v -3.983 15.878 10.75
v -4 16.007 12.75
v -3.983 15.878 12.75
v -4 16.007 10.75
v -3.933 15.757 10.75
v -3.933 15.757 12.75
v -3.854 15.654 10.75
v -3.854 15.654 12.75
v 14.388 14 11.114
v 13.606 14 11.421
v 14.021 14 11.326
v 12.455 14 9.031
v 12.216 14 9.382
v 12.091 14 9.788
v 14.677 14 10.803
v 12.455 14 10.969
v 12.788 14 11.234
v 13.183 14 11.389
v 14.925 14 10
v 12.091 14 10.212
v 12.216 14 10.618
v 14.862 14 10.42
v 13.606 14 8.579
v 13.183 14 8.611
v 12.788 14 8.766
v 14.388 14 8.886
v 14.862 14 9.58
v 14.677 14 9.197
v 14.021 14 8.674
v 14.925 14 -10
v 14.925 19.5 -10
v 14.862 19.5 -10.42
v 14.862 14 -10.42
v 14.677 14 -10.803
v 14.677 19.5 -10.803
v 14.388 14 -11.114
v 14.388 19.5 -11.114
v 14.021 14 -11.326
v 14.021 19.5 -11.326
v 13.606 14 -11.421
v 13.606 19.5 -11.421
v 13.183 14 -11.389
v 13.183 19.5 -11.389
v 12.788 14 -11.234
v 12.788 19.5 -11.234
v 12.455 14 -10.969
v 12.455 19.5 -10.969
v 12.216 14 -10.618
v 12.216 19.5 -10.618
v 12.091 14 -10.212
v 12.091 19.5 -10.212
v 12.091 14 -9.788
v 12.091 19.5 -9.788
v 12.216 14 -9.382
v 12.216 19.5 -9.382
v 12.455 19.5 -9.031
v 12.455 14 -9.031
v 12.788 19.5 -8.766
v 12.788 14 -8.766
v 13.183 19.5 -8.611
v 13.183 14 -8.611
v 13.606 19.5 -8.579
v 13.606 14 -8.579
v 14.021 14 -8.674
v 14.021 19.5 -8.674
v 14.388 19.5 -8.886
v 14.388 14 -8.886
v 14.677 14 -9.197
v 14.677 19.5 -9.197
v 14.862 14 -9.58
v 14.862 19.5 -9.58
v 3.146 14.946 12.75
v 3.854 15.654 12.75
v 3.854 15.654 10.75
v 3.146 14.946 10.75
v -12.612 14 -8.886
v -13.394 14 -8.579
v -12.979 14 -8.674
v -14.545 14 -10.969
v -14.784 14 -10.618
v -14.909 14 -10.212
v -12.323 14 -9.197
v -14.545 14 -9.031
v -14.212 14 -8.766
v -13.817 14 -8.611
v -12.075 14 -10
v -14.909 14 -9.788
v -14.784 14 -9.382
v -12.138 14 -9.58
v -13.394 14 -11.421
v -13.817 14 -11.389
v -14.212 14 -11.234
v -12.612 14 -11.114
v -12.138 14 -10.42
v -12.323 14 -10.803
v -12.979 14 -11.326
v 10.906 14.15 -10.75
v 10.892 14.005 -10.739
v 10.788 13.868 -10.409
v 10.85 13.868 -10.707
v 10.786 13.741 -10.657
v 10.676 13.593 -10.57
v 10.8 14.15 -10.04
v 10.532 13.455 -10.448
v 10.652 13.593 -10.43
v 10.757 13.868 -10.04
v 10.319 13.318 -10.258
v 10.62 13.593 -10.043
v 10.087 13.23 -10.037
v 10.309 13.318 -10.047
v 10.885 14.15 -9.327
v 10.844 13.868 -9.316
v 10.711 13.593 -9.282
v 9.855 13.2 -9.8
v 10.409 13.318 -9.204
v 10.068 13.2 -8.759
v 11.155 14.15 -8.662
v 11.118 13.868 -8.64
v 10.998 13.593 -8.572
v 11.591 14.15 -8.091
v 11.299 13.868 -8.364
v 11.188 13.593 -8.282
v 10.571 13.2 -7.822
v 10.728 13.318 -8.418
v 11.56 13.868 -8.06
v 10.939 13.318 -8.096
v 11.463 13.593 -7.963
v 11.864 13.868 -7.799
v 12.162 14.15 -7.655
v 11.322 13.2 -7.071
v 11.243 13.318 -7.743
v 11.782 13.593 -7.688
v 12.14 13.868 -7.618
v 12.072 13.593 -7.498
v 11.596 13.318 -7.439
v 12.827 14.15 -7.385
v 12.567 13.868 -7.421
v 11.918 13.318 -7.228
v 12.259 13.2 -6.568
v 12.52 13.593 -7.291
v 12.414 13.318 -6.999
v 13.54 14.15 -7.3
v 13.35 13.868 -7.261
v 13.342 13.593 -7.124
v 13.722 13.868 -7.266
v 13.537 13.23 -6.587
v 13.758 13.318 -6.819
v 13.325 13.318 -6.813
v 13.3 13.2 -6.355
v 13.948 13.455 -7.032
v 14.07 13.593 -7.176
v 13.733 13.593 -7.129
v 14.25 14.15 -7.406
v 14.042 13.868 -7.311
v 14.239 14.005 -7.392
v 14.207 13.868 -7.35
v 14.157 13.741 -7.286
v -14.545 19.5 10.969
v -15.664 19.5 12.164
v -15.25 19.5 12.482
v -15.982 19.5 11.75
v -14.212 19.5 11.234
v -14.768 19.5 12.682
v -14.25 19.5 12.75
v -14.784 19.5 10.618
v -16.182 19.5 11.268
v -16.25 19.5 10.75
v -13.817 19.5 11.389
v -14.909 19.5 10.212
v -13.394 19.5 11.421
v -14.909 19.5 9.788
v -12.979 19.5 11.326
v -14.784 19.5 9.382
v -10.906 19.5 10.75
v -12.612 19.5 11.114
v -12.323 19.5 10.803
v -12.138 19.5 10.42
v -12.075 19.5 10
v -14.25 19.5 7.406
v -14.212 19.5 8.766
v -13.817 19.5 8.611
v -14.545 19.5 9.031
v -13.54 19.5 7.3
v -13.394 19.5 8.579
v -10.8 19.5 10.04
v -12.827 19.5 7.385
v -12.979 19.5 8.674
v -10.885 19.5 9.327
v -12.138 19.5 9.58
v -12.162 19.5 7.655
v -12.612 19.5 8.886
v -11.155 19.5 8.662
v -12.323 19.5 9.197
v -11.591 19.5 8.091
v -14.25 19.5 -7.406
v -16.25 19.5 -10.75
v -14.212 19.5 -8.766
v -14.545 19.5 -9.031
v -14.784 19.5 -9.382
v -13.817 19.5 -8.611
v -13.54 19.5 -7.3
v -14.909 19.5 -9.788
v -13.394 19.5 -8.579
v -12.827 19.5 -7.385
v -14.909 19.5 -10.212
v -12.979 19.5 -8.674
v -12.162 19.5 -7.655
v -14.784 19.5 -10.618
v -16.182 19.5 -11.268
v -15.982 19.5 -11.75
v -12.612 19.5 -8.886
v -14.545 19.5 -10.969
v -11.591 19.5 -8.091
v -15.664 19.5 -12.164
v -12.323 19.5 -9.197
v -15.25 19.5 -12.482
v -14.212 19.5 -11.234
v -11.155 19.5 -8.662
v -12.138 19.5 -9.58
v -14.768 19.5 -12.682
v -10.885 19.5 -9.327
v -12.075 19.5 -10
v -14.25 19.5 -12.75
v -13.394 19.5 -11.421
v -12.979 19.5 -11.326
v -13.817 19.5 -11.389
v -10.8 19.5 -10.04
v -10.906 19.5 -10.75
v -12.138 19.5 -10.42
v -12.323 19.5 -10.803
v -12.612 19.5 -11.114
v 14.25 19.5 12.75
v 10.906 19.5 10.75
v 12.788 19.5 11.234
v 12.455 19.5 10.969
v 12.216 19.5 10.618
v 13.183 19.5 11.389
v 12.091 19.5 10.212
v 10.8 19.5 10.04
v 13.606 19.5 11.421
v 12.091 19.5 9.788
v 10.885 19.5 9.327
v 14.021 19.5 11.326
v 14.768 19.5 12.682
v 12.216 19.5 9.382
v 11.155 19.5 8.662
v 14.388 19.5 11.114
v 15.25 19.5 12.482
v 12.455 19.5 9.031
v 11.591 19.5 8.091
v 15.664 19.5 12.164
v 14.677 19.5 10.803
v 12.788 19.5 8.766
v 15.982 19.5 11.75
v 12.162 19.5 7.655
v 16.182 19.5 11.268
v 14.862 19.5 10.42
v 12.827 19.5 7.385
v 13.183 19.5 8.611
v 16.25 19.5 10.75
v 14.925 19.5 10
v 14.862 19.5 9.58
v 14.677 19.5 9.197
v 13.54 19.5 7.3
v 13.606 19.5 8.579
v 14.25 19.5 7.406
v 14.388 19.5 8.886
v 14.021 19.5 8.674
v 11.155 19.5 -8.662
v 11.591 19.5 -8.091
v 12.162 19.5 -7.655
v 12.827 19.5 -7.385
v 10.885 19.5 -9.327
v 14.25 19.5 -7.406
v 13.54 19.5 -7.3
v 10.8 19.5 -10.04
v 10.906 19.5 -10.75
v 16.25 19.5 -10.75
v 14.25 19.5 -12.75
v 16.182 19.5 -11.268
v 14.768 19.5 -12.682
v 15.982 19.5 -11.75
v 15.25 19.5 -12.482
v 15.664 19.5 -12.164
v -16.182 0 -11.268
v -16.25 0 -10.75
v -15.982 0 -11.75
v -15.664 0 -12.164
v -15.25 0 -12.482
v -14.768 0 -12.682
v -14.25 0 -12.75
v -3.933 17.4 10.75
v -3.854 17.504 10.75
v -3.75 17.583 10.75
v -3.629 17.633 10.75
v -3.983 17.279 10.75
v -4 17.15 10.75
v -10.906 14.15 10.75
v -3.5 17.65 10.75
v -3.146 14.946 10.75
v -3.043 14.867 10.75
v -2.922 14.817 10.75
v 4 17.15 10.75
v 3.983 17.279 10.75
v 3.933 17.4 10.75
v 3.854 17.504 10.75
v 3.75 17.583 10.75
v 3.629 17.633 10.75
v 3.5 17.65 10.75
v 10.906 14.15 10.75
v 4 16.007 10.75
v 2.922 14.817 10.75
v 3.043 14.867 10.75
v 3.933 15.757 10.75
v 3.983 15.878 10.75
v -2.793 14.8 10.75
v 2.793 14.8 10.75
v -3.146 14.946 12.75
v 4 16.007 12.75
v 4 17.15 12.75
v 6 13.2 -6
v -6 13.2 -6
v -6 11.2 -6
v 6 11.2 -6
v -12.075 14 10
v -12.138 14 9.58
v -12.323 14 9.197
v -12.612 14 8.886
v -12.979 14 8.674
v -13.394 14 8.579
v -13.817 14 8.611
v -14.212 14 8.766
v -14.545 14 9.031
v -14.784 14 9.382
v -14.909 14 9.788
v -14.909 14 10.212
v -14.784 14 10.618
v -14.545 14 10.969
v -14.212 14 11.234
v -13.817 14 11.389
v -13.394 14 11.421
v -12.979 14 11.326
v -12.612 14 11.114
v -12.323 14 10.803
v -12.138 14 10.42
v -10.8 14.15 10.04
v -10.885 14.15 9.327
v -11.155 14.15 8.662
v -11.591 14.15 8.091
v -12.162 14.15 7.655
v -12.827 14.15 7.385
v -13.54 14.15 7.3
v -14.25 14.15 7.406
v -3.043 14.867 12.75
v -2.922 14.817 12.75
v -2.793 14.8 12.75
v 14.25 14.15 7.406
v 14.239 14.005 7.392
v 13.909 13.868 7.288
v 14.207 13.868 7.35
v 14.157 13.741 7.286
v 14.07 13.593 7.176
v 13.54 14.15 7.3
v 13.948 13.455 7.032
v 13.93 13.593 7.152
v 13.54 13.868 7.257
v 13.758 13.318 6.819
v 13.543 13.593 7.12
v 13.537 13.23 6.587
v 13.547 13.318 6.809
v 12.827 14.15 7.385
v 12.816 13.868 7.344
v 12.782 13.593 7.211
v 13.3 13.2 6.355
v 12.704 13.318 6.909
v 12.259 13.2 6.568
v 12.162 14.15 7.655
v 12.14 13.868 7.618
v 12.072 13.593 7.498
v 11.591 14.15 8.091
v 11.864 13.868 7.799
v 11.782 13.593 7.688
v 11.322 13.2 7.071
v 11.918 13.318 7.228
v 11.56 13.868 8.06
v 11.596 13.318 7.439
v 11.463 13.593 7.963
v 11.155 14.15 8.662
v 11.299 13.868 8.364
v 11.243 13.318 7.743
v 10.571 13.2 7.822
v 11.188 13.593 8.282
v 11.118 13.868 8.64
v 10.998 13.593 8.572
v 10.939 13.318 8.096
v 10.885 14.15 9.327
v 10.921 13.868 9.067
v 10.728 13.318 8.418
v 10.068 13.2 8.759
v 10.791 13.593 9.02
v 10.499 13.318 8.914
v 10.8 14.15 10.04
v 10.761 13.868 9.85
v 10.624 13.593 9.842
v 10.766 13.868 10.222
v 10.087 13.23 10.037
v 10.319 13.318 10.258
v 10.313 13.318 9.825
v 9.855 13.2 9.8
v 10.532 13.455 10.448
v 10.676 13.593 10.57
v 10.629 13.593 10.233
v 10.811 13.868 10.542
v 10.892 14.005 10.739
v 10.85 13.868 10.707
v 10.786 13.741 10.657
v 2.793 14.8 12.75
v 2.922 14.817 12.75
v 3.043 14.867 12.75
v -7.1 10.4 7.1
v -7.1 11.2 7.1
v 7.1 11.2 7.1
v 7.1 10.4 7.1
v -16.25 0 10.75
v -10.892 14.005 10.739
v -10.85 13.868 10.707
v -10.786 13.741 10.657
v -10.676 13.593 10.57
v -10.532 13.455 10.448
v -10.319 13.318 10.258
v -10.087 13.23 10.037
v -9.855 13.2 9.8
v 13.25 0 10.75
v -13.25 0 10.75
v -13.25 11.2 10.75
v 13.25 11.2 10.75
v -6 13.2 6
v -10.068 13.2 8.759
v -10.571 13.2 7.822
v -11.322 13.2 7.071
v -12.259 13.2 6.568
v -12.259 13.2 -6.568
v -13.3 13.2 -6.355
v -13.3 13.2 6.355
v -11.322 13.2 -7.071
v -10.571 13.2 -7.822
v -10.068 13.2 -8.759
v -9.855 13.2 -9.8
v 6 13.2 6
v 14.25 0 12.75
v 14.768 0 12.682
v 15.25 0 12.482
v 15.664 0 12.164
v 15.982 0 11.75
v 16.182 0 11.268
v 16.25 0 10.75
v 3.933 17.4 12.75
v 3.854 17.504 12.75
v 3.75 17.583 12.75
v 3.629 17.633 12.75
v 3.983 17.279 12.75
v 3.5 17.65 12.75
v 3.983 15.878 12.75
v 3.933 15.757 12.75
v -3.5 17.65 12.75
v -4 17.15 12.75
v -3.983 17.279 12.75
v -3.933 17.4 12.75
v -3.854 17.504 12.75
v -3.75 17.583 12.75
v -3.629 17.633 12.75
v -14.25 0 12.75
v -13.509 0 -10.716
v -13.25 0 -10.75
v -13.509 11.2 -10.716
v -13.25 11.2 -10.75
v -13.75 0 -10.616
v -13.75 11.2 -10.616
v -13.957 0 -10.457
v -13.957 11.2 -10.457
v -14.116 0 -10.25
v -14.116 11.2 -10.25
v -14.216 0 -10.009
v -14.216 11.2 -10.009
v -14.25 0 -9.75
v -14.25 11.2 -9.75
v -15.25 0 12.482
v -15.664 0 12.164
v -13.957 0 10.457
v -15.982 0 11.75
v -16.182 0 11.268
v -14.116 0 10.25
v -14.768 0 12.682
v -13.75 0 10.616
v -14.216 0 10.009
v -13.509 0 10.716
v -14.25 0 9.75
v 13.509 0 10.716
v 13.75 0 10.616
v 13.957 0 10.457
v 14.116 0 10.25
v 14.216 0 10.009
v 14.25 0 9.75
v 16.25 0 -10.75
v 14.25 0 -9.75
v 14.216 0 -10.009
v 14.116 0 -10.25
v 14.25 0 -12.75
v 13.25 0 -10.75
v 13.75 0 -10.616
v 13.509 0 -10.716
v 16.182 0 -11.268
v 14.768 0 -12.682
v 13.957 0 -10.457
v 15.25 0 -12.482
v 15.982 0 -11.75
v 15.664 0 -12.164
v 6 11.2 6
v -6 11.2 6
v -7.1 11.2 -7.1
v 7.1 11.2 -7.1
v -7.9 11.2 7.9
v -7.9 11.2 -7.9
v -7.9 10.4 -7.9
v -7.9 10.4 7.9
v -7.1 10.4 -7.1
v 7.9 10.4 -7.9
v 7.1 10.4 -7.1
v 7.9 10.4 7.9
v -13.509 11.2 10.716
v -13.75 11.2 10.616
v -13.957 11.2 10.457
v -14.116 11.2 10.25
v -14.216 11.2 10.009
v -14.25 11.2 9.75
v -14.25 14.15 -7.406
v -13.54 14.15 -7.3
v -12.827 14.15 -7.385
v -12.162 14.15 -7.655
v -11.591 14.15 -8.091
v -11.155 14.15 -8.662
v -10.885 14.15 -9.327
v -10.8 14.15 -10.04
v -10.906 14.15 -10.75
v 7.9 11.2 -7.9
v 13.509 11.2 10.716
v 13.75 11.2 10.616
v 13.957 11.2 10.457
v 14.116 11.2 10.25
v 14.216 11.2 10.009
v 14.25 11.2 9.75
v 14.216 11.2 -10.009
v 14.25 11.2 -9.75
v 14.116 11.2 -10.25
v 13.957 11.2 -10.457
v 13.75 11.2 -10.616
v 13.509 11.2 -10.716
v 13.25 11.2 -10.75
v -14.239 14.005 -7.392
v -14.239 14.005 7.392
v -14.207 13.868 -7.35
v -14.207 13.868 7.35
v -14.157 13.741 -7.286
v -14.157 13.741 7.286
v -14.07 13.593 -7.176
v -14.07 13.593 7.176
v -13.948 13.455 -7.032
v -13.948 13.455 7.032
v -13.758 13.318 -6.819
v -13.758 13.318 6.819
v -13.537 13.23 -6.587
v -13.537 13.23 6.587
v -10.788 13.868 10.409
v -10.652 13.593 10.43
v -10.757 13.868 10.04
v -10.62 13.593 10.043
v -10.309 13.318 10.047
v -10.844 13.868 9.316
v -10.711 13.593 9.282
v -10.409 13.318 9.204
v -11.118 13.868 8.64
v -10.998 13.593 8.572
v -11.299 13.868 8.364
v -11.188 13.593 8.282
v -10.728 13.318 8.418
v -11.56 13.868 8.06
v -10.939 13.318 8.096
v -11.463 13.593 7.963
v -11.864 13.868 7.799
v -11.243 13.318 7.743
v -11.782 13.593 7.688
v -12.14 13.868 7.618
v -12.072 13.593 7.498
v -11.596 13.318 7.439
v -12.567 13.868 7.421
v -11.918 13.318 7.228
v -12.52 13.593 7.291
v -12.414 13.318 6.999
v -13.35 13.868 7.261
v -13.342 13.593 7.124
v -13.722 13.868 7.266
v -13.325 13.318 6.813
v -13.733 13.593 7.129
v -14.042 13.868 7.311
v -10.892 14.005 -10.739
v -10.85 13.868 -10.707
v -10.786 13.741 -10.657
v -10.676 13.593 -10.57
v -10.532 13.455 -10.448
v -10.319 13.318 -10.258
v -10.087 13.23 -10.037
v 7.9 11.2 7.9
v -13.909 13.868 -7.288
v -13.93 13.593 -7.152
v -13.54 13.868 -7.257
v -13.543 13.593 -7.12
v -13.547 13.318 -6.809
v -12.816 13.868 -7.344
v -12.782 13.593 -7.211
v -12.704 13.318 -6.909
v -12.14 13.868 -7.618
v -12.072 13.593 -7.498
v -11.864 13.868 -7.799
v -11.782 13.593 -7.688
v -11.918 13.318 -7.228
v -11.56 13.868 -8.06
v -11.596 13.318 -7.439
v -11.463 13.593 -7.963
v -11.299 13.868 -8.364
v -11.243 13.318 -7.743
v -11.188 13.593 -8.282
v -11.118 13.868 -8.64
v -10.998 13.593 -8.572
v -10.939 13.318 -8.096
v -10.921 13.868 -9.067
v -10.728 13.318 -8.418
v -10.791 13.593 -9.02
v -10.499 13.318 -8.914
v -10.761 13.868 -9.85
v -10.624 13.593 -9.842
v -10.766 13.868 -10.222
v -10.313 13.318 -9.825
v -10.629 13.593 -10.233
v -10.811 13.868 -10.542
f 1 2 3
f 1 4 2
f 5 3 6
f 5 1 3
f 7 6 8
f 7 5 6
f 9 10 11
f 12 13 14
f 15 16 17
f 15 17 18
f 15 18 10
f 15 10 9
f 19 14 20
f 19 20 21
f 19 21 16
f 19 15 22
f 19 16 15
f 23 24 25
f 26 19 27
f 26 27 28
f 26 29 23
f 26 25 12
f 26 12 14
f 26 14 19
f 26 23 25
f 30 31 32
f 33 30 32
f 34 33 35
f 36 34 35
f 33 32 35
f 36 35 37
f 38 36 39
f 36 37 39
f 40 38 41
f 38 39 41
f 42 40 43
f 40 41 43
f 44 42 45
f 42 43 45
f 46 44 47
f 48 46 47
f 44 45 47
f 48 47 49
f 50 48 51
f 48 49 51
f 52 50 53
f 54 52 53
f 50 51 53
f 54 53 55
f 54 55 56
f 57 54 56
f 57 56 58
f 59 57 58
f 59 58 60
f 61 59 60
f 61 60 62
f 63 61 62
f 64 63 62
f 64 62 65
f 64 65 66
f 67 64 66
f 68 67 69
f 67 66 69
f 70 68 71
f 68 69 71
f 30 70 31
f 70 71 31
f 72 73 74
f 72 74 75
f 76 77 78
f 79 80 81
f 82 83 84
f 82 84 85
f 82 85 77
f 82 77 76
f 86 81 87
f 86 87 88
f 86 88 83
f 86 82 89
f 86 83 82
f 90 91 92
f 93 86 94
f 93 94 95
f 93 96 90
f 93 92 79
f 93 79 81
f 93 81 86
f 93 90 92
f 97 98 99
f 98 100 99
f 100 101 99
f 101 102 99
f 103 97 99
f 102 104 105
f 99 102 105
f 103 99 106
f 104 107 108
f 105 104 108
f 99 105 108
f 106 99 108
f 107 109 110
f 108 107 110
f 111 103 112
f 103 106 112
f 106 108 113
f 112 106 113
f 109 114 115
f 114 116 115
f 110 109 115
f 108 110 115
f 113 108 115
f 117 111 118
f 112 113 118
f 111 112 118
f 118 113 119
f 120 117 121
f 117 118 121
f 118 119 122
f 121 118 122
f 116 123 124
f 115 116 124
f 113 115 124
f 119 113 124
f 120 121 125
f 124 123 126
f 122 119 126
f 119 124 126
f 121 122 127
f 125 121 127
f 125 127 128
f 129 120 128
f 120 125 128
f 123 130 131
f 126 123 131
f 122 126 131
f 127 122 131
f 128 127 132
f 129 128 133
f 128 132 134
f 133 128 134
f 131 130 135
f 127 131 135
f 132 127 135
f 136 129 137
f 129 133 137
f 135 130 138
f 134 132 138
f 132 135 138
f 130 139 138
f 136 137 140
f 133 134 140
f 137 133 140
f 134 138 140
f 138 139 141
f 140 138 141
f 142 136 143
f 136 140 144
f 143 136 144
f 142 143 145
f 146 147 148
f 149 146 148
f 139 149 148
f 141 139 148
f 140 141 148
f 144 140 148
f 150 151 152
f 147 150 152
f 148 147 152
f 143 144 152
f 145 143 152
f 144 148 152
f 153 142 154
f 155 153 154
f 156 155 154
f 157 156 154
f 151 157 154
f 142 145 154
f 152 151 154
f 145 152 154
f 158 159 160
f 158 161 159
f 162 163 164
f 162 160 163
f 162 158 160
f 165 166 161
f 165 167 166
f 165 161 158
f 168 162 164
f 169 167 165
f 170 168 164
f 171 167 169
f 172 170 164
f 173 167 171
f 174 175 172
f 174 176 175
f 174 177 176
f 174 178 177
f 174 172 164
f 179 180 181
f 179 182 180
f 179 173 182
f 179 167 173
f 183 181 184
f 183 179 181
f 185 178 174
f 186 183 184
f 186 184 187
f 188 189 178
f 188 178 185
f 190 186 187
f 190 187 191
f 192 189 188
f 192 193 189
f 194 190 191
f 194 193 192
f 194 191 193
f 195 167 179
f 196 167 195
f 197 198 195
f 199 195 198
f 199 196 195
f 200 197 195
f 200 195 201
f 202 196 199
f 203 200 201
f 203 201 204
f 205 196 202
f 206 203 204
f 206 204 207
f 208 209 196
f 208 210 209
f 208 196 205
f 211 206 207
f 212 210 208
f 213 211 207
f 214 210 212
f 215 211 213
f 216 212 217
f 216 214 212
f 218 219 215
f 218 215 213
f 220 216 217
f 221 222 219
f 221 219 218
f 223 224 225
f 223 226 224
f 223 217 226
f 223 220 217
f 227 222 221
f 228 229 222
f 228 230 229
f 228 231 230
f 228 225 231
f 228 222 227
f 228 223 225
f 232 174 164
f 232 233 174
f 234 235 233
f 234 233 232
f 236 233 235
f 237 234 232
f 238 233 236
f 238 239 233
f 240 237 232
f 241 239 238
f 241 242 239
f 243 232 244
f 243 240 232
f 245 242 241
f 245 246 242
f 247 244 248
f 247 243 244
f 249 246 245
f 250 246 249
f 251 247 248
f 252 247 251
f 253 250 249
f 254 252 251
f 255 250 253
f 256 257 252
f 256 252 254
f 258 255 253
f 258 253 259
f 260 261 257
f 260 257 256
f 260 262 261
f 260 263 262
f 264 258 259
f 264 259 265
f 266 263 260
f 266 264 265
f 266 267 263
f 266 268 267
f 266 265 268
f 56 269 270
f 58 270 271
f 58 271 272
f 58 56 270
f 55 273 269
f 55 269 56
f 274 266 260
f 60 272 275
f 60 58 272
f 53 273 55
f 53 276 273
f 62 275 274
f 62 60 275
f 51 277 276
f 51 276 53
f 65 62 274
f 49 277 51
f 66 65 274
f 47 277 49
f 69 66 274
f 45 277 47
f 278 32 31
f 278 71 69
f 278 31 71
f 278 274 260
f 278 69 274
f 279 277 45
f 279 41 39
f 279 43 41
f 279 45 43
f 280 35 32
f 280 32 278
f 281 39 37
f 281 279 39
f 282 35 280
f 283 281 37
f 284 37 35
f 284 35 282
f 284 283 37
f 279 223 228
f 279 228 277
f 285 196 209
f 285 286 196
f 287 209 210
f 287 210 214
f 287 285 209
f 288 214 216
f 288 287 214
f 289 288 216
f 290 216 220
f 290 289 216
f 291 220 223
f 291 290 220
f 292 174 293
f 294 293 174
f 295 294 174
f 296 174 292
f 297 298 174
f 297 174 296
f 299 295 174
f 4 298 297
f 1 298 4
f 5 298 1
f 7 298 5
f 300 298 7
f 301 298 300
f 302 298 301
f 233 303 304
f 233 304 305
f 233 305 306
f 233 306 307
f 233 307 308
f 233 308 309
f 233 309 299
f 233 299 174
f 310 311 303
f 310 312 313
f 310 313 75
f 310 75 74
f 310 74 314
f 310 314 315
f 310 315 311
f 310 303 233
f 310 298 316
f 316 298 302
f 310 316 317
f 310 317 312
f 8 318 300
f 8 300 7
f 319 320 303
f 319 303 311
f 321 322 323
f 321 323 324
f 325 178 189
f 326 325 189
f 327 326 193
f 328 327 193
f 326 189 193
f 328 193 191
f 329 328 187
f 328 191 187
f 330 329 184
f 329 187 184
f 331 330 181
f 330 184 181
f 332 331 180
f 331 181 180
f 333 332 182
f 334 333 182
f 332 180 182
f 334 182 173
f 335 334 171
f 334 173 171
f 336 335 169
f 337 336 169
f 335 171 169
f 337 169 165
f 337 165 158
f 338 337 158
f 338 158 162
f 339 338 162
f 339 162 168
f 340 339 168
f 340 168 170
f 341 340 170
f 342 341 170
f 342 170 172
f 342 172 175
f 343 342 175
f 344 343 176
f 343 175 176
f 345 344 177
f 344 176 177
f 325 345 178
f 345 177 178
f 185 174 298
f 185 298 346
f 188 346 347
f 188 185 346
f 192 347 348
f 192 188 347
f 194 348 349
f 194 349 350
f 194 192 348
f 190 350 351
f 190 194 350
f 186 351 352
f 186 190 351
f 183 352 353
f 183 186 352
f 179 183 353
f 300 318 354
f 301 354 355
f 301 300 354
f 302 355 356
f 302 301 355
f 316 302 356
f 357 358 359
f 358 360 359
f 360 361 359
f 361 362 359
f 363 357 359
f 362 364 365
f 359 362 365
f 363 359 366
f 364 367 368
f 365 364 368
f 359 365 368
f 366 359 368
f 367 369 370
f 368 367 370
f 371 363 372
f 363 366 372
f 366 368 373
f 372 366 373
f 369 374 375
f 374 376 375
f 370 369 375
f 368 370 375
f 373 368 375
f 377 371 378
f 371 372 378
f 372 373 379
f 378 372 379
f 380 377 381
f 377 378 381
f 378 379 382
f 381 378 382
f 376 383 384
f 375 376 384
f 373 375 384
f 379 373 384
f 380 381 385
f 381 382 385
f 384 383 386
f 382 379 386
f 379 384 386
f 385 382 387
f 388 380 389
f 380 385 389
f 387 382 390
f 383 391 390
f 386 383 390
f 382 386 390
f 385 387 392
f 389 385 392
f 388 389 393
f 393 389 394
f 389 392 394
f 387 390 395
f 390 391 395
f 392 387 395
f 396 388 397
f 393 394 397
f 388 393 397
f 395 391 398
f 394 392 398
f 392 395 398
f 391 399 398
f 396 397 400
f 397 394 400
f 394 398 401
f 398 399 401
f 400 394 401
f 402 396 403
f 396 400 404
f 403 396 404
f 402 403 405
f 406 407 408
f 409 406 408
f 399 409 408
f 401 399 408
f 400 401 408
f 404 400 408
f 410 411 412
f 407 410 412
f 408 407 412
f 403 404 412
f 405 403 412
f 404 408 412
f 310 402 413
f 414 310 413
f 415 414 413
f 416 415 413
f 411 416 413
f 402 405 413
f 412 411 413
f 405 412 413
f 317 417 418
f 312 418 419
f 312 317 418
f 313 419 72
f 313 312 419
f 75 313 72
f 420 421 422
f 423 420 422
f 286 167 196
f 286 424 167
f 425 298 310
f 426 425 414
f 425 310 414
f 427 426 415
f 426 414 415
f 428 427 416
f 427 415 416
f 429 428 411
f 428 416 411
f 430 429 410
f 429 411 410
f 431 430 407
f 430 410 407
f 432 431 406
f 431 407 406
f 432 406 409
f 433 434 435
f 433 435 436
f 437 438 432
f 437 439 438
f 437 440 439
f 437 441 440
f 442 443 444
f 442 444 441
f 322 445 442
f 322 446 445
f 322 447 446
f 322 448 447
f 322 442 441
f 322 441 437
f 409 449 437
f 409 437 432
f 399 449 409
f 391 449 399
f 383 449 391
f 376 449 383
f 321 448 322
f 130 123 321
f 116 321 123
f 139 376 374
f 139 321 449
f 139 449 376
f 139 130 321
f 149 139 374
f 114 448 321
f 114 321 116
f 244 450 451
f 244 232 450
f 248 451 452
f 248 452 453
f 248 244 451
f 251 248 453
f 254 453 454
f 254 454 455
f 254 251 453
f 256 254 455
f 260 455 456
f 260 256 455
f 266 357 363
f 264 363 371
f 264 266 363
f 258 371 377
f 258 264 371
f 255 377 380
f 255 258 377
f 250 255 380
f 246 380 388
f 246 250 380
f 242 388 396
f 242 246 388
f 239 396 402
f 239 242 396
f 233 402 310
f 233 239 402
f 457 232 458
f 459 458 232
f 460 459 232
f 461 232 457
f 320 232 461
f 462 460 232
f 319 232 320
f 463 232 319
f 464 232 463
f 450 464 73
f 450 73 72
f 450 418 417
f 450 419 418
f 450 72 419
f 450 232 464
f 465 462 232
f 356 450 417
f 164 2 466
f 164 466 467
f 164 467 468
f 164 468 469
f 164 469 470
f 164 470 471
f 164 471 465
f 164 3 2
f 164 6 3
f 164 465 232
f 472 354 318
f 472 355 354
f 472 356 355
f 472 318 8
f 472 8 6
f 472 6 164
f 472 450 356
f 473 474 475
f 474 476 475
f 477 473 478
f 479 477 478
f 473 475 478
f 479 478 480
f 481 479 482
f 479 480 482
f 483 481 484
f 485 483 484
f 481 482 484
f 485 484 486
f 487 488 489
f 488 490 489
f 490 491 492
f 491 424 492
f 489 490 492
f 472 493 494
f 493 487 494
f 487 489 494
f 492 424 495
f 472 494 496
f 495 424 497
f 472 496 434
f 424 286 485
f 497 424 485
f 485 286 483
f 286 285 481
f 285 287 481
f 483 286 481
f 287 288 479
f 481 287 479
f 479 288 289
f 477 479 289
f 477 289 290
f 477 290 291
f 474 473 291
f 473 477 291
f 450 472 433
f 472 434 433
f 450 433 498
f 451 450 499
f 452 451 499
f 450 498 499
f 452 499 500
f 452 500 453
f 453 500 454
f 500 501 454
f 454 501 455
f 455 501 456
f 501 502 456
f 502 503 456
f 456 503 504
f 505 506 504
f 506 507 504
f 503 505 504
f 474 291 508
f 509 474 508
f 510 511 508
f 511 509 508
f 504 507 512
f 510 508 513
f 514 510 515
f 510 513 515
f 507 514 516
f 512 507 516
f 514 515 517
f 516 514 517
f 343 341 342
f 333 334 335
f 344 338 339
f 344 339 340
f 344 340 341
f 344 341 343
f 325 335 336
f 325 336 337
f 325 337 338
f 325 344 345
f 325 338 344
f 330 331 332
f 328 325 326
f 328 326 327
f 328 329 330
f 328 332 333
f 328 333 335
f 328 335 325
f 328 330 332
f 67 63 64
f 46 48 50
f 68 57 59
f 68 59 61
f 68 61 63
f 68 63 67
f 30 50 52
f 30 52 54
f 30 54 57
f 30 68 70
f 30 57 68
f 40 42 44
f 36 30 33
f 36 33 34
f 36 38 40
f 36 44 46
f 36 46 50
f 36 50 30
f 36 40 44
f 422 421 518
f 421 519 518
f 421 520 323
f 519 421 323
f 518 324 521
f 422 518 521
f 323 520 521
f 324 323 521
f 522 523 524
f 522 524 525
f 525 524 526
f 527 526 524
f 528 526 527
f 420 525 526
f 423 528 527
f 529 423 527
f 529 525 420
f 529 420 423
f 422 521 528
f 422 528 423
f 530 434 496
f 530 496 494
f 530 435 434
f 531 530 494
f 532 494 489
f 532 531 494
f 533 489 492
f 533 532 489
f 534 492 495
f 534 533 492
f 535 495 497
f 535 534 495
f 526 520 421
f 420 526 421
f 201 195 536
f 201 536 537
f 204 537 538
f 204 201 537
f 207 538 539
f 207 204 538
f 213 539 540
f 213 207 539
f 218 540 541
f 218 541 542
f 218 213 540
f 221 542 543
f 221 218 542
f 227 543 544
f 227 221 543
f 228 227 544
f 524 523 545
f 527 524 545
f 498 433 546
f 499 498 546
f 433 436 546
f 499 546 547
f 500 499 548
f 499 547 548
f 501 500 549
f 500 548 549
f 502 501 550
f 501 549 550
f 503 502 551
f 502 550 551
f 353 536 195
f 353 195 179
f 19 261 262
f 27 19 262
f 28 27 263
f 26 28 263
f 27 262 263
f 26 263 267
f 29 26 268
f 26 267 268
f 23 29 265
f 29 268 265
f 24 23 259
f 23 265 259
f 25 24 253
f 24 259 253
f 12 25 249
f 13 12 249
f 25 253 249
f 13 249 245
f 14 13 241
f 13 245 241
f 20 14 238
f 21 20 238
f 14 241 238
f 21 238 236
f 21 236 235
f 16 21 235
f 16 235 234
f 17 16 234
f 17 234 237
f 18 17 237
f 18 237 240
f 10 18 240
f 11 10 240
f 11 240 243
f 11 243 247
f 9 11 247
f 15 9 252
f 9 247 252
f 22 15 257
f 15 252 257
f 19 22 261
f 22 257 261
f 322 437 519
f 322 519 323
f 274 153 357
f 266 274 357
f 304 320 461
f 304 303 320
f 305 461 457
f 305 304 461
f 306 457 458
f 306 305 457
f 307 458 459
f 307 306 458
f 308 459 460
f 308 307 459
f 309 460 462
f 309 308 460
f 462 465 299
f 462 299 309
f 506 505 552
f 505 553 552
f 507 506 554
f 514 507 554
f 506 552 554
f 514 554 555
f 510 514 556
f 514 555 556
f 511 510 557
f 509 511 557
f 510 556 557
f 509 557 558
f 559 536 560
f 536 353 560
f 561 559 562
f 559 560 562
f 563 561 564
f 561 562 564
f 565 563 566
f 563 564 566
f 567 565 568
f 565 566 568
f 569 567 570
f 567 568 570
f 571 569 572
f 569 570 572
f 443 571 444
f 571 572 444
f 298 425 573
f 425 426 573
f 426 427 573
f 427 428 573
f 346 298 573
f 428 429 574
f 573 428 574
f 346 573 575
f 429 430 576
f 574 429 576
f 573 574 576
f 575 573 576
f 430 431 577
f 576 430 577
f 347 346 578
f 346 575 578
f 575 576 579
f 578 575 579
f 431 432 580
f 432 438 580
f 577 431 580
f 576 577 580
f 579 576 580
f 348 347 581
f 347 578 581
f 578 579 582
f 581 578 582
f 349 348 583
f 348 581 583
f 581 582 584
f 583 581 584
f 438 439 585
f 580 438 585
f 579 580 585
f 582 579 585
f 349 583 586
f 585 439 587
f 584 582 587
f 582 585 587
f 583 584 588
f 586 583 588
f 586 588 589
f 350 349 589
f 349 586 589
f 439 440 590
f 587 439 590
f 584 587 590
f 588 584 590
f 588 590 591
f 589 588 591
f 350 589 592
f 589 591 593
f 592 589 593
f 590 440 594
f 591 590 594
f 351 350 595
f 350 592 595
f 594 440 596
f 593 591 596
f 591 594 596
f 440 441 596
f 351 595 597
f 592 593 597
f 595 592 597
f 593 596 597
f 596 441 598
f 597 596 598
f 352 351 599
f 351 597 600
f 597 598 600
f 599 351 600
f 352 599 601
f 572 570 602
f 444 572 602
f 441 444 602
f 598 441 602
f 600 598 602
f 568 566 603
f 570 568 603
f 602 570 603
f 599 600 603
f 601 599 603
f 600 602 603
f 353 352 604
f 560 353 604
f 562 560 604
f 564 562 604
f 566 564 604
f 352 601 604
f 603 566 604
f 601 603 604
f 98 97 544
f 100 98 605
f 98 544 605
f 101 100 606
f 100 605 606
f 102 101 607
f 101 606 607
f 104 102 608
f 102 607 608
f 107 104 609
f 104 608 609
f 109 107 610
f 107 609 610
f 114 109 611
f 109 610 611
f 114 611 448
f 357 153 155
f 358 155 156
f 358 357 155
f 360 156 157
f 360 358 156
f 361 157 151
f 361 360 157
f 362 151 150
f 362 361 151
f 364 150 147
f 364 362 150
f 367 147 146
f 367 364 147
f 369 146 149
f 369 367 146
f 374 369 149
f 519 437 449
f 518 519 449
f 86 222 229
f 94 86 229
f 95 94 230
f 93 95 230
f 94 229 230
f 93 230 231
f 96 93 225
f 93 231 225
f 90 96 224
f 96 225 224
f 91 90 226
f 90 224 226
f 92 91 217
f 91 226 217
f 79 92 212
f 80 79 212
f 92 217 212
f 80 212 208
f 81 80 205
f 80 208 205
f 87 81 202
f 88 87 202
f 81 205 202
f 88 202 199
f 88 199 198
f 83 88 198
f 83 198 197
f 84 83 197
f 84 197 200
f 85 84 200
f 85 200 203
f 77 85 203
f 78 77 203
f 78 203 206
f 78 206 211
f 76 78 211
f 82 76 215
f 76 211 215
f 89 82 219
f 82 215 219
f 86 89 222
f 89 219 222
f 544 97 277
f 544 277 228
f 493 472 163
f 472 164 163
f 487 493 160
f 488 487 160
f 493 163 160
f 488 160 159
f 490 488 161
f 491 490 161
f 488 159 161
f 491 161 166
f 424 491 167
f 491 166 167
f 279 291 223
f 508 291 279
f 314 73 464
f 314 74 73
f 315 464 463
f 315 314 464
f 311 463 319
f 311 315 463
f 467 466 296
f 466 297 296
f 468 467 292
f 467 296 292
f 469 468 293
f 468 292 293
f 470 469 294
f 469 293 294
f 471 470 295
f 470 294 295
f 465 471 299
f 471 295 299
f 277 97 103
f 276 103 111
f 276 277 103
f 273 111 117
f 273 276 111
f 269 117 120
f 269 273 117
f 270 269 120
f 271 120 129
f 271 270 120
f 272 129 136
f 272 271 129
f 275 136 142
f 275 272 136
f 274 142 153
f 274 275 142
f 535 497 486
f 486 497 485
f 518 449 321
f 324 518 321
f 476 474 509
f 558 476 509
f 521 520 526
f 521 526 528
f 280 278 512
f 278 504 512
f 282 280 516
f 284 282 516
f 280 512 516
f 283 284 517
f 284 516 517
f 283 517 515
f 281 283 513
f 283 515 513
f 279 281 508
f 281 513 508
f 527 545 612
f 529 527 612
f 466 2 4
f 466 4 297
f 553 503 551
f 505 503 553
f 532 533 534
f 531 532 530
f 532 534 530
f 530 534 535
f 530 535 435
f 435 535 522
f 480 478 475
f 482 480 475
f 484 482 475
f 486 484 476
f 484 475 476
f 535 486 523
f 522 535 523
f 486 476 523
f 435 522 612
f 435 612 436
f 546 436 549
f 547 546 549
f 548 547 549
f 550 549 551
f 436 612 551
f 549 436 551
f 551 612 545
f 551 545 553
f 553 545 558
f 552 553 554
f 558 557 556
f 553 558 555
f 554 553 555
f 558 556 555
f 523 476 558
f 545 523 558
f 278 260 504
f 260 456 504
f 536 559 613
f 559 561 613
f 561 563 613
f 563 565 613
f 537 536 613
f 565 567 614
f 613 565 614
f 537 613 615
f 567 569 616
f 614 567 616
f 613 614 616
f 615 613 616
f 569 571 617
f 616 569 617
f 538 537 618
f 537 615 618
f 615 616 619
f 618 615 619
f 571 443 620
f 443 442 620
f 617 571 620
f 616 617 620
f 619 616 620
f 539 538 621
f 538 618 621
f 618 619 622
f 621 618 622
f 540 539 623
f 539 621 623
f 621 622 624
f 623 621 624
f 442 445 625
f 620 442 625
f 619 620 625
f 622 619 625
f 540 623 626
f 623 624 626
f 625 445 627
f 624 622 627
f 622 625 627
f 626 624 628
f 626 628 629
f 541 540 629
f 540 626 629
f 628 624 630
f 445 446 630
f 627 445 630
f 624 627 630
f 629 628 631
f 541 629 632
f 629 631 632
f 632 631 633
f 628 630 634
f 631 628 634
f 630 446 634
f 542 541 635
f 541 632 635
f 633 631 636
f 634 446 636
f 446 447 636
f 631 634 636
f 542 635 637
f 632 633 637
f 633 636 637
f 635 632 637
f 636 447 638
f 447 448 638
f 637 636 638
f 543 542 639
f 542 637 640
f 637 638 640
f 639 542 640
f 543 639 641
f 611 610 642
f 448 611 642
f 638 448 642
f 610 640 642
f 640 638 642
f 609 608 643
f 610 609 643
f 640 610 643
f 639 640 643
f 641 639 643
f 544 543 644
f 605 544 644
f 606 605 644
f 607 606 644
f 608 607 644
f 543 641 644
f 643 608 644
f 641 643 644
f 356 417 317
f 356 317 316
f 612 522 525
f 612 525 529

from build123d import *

# Parameters (mm, degrees)
SKETCH_1_W          = 32.5
SKETCH_1_H          = 25.5
SKETCH_1_W_2        = 28.5
SKETCH_1_H_2        = 21.5
EXTRUDE_1_DEPTH     = 13.2
SKETCH_2_W          = 28.5
SKETCH_2_H          = 21.5
SKETCH_2_W_2        = 12
SKETCH_2_H_2        = 12
EXTRUDE_2_DEPTH     = 2
EXTRUDE_3_DEPTH     = 6.3
EXTRUDE_4_REACH     = 21.5
SKETCH_6_R          = 2.7
SKETCH_7_R          = 1.425
CUT_EXTRUDE_3_DEPTH = 5.5
SKETCH_10_W         = 15.8
SKETCH_10_H         = 15.8
SKETCH_10_W_2       = 14.2
SKETCH_10_H_2       = 14.2
EXTRUDE_5_DEPTH     = 0.8
CUT_EXTRUDE_5_DEPTH = 3
FILLET_6_R          = 0.5
FILLET_3_R          = 0.95
FILLET_1_R          = 2
FILLET_2_R          = 1


with BuildPart() as part:
    # 草图1 → 凸台-拉伸1 (new body)
    with BuildSketch(Plane(origin=(0, 0, 0), x_dir=(1, 0, 0), z_dir=(0, 1, 0))):
        Rectangle(SKETCH_1_W, SKETCH_1_H)
        Rectangle(SKETCH_1_W_2, SKETCH_1_H_2, mode=Mode.SUBTRACT)
    extrude(amount=EXTRUDE_1_DEPTH)

    # 草图2 → 凸台-拉伸2 (add)
    with BuildSketch(Plane(origin=(0, 13.2, 0), x_dir=(1, 0, 0), z_dir=(0, 1, 0))):
        Rectangle(SKETCH_2_W, SKETCH_2_H)
        Rectangle(SKETCH_2_W_2, SKETCH_2_H_2, mode=Mode.SUBTRACT)
    extrude(amount=-EXTRUDE_2_DEPTH)

    # 草图3 → 凸台-拉伸3 (add)
    with BuildSketch(Plane(origin=(0, 13.2, 0), x_dir=(1, 0, 0), z_dir=(0, 1, 0))):
        Polygon((-16.25, -12.75), (-16.25, 12.75), (16.25, 12.75), (16.25, -0.040360215), (16.25, -12.75), align=None)
        Polygon((14.25, 0.013681835), (14.25, 10.75), (-14.25, 10.75), (-14.25, -10.75), (14.25, -10.75), align=None, mode=Mode.SUBTRACT)
    extrude(amount=EXTRUDE_3_DEPTH)

    # 草图6 → 凸台-拉伸4 (add, up to next)
    with BuildSketch(Plane(origin=(0, 19.5, 0), x_dir=(1, 0, 0), z_dir=(0, 1, 0)), mode=Mode.PRIVATE) as extrude_4_sk1:
        with Locations((13.5, 10)):
            Circle(SKETCH_6_R)
    extrude_4_tool1 = extrude(extrude_4_sk1.sketch, amount=-EXTRUDE_4_REACH, mode=Mode.PRIVATE) - part.part
    add(extrude_4_tool1.solids().sort_by_distance((13.5, 19.5, -10))[0])
    # 草图6 → 凸台-拉伸4 (add, up to next)
    with BuildSketch(Plane(origin=(0, 19.5, 0), x_dir=(1, 0, 0), z_dir=(0, 1, 0)), mode=Mode.PRIVATE) as extrude_4_sk2:
        with Locations((13.5, -10)):
            Circle(SKETCH_6_R)
    extrude_4_tool2 = extrude(extrude_4_sk2.sketch, amount=-EXTRUDE_4_REACH, mode=Mode.PRIVATE) - part.part
    add(extrude_4_tool2.solids().sort_by_distance((13.5, 19.5, 10))[0])
    # 草图6 → 凸台-拉伸4 (add, up to next)
    with BuildSketch(Plane(origin=(0, 19.5, 0), x_dir=(1, 0, 0), z_dir=(0, 1, 0)), mode=Mode.PRIVATE) as extrude_4_sk3:
        with Locations((-13.5, -10)):
            Circle(SKETCH_6_R)
    extrude_4_tool3 = extrude(extrude_4_sk3.sketch, amount=-EXTRUDE_4_REACH, mode=Mode.PRIVATE) - part.part
    add(extrude_4_tool3.solids().sort_by_distance((-13.5, 19.5, 10))[0])
    # 草图6 → 凸台-拉伸4 (add, up to next)
    with BuildSketch(Plane(origin=(0, 19.5, 0), x_dir=(1, 0, 0), z_dir=(0, 1, 0)), mode=Mode.PRIVATE) as extrude_4_sk4:
        with Locations((-13.5, 10)):
            Circle(SKETCH_6_R)
    extrude_4_tool4 = extrude(extrude_4_sk4.sketch, amount=-EXTRUDE_4_REACH, mode=Mode.PRIVATE) - part.part
    add(extrude_4_tool4.solids().sort_by_distance((-13.5, 19.5, -10))[0])

    # 草图7 → 切除-拉伸3 (cut)
    with BuildSketch(Plane(origin=(0, 19.5, 0), x_dir=(1, 0, 0), z_dir=(0, 1, 0))):
        with Locations((13.5, 10)):
            Circle(SKETCH_7_R)
        with Locations((13.5, -10)):
            Circle(SKETCH_7_R)
        with Locations((-13.5, -10)):
            Circle(SKETCH_7_R)
        with Locations((-13.5, 10)):
            Circle(SKETCH_7_R)
    extrude(amount=-CUT_EXTRUDE_3_DEPTH, mode=Mode.SUBTRACT)

    # 草图10 → 凸台-拉伸5 (add)
    with BuildSketch(Plane.XZ.offset(-11.2)):
        Rectangle(SKETCH_10_W, SKETCH_10_H)
        Rectangle(SKETCH_10_W_2, SKETCH_10_H_2, mode=Mode.SUBTRACT)
    extrude(amount=EXTRUDE_5_DEPTH)

    # 草图11 → 切除-拉伸5 (cut)
    with BuildSketch(Plane.XY.offset(12.75)):
        Polygon((-4, 17.65), (4, 17.65), (4, 15.8), (3, 14.8), (-3, 14.8), (-4, 15.8), align=None)
    extrude(amount=-CUT_EXTRUDE_5_DEPTH, mode=Mode.SUBTRACT)

    # 圆角6
    fillet_6_edges = [part.edges().sort_by_distance(p)[0] for p in [
        (4, 17.65, 11.75),
        (4, 15.8, 11.75),
        (3, 14.8, 11.75),
        (-3, 14.8, 11.75),
        (-4, 15.8, 11.75),
        (-4, 17.65, 11.75),
    ]]
    fillet(fillet_6_edges, radius=FILLET_6_R)

    # 圆角3
    fillet_3_edges = [part.edges().sort_by_distance(p)[0] for p in [
        (0, 13.2, 10.75),
        (-11.590811691, 13.2, 8.090811691),
        (-14.25, 13.2, 0),
        (-11.590811691, 13.2, -8.090811691),
        (0, 13.2, -10.75),
        (11.590811691, 13.2, -8.090811691),
        (14.25, 13.2, 0),
        (11.590811691, 13.2, 8.090811691),
    ]]
    fillet(fillet_3_edges, radius=FILLET_3_R)

    # 圆角1
    fillet_1_edges = [part.edges().sort_by_distance(p)[0] for p in [
        (16.25, 9.75, 12.75),
        (-16.25, 9.75, 12.75),
        (-16.25, 9.75, -12.75),
        (16.25, 9.75, -12.75),
    ]]
    fillet(fillet_1_edges, radius=FILLET_1_R)

    # 圆角2
    fillet_2_edges = [part.edges().sort_by_distance(p)[0] for p in [
        (-14.25, 5.6, 10.75),
        (14.25, 5.6, 10.75),
        (-14.25, 5.6, -10.75),
        (14.25, 5.6, -10.75),
    ]]
    fillet(fillet_2_edges, radius=FILLET_2_R)


solid = part.part
